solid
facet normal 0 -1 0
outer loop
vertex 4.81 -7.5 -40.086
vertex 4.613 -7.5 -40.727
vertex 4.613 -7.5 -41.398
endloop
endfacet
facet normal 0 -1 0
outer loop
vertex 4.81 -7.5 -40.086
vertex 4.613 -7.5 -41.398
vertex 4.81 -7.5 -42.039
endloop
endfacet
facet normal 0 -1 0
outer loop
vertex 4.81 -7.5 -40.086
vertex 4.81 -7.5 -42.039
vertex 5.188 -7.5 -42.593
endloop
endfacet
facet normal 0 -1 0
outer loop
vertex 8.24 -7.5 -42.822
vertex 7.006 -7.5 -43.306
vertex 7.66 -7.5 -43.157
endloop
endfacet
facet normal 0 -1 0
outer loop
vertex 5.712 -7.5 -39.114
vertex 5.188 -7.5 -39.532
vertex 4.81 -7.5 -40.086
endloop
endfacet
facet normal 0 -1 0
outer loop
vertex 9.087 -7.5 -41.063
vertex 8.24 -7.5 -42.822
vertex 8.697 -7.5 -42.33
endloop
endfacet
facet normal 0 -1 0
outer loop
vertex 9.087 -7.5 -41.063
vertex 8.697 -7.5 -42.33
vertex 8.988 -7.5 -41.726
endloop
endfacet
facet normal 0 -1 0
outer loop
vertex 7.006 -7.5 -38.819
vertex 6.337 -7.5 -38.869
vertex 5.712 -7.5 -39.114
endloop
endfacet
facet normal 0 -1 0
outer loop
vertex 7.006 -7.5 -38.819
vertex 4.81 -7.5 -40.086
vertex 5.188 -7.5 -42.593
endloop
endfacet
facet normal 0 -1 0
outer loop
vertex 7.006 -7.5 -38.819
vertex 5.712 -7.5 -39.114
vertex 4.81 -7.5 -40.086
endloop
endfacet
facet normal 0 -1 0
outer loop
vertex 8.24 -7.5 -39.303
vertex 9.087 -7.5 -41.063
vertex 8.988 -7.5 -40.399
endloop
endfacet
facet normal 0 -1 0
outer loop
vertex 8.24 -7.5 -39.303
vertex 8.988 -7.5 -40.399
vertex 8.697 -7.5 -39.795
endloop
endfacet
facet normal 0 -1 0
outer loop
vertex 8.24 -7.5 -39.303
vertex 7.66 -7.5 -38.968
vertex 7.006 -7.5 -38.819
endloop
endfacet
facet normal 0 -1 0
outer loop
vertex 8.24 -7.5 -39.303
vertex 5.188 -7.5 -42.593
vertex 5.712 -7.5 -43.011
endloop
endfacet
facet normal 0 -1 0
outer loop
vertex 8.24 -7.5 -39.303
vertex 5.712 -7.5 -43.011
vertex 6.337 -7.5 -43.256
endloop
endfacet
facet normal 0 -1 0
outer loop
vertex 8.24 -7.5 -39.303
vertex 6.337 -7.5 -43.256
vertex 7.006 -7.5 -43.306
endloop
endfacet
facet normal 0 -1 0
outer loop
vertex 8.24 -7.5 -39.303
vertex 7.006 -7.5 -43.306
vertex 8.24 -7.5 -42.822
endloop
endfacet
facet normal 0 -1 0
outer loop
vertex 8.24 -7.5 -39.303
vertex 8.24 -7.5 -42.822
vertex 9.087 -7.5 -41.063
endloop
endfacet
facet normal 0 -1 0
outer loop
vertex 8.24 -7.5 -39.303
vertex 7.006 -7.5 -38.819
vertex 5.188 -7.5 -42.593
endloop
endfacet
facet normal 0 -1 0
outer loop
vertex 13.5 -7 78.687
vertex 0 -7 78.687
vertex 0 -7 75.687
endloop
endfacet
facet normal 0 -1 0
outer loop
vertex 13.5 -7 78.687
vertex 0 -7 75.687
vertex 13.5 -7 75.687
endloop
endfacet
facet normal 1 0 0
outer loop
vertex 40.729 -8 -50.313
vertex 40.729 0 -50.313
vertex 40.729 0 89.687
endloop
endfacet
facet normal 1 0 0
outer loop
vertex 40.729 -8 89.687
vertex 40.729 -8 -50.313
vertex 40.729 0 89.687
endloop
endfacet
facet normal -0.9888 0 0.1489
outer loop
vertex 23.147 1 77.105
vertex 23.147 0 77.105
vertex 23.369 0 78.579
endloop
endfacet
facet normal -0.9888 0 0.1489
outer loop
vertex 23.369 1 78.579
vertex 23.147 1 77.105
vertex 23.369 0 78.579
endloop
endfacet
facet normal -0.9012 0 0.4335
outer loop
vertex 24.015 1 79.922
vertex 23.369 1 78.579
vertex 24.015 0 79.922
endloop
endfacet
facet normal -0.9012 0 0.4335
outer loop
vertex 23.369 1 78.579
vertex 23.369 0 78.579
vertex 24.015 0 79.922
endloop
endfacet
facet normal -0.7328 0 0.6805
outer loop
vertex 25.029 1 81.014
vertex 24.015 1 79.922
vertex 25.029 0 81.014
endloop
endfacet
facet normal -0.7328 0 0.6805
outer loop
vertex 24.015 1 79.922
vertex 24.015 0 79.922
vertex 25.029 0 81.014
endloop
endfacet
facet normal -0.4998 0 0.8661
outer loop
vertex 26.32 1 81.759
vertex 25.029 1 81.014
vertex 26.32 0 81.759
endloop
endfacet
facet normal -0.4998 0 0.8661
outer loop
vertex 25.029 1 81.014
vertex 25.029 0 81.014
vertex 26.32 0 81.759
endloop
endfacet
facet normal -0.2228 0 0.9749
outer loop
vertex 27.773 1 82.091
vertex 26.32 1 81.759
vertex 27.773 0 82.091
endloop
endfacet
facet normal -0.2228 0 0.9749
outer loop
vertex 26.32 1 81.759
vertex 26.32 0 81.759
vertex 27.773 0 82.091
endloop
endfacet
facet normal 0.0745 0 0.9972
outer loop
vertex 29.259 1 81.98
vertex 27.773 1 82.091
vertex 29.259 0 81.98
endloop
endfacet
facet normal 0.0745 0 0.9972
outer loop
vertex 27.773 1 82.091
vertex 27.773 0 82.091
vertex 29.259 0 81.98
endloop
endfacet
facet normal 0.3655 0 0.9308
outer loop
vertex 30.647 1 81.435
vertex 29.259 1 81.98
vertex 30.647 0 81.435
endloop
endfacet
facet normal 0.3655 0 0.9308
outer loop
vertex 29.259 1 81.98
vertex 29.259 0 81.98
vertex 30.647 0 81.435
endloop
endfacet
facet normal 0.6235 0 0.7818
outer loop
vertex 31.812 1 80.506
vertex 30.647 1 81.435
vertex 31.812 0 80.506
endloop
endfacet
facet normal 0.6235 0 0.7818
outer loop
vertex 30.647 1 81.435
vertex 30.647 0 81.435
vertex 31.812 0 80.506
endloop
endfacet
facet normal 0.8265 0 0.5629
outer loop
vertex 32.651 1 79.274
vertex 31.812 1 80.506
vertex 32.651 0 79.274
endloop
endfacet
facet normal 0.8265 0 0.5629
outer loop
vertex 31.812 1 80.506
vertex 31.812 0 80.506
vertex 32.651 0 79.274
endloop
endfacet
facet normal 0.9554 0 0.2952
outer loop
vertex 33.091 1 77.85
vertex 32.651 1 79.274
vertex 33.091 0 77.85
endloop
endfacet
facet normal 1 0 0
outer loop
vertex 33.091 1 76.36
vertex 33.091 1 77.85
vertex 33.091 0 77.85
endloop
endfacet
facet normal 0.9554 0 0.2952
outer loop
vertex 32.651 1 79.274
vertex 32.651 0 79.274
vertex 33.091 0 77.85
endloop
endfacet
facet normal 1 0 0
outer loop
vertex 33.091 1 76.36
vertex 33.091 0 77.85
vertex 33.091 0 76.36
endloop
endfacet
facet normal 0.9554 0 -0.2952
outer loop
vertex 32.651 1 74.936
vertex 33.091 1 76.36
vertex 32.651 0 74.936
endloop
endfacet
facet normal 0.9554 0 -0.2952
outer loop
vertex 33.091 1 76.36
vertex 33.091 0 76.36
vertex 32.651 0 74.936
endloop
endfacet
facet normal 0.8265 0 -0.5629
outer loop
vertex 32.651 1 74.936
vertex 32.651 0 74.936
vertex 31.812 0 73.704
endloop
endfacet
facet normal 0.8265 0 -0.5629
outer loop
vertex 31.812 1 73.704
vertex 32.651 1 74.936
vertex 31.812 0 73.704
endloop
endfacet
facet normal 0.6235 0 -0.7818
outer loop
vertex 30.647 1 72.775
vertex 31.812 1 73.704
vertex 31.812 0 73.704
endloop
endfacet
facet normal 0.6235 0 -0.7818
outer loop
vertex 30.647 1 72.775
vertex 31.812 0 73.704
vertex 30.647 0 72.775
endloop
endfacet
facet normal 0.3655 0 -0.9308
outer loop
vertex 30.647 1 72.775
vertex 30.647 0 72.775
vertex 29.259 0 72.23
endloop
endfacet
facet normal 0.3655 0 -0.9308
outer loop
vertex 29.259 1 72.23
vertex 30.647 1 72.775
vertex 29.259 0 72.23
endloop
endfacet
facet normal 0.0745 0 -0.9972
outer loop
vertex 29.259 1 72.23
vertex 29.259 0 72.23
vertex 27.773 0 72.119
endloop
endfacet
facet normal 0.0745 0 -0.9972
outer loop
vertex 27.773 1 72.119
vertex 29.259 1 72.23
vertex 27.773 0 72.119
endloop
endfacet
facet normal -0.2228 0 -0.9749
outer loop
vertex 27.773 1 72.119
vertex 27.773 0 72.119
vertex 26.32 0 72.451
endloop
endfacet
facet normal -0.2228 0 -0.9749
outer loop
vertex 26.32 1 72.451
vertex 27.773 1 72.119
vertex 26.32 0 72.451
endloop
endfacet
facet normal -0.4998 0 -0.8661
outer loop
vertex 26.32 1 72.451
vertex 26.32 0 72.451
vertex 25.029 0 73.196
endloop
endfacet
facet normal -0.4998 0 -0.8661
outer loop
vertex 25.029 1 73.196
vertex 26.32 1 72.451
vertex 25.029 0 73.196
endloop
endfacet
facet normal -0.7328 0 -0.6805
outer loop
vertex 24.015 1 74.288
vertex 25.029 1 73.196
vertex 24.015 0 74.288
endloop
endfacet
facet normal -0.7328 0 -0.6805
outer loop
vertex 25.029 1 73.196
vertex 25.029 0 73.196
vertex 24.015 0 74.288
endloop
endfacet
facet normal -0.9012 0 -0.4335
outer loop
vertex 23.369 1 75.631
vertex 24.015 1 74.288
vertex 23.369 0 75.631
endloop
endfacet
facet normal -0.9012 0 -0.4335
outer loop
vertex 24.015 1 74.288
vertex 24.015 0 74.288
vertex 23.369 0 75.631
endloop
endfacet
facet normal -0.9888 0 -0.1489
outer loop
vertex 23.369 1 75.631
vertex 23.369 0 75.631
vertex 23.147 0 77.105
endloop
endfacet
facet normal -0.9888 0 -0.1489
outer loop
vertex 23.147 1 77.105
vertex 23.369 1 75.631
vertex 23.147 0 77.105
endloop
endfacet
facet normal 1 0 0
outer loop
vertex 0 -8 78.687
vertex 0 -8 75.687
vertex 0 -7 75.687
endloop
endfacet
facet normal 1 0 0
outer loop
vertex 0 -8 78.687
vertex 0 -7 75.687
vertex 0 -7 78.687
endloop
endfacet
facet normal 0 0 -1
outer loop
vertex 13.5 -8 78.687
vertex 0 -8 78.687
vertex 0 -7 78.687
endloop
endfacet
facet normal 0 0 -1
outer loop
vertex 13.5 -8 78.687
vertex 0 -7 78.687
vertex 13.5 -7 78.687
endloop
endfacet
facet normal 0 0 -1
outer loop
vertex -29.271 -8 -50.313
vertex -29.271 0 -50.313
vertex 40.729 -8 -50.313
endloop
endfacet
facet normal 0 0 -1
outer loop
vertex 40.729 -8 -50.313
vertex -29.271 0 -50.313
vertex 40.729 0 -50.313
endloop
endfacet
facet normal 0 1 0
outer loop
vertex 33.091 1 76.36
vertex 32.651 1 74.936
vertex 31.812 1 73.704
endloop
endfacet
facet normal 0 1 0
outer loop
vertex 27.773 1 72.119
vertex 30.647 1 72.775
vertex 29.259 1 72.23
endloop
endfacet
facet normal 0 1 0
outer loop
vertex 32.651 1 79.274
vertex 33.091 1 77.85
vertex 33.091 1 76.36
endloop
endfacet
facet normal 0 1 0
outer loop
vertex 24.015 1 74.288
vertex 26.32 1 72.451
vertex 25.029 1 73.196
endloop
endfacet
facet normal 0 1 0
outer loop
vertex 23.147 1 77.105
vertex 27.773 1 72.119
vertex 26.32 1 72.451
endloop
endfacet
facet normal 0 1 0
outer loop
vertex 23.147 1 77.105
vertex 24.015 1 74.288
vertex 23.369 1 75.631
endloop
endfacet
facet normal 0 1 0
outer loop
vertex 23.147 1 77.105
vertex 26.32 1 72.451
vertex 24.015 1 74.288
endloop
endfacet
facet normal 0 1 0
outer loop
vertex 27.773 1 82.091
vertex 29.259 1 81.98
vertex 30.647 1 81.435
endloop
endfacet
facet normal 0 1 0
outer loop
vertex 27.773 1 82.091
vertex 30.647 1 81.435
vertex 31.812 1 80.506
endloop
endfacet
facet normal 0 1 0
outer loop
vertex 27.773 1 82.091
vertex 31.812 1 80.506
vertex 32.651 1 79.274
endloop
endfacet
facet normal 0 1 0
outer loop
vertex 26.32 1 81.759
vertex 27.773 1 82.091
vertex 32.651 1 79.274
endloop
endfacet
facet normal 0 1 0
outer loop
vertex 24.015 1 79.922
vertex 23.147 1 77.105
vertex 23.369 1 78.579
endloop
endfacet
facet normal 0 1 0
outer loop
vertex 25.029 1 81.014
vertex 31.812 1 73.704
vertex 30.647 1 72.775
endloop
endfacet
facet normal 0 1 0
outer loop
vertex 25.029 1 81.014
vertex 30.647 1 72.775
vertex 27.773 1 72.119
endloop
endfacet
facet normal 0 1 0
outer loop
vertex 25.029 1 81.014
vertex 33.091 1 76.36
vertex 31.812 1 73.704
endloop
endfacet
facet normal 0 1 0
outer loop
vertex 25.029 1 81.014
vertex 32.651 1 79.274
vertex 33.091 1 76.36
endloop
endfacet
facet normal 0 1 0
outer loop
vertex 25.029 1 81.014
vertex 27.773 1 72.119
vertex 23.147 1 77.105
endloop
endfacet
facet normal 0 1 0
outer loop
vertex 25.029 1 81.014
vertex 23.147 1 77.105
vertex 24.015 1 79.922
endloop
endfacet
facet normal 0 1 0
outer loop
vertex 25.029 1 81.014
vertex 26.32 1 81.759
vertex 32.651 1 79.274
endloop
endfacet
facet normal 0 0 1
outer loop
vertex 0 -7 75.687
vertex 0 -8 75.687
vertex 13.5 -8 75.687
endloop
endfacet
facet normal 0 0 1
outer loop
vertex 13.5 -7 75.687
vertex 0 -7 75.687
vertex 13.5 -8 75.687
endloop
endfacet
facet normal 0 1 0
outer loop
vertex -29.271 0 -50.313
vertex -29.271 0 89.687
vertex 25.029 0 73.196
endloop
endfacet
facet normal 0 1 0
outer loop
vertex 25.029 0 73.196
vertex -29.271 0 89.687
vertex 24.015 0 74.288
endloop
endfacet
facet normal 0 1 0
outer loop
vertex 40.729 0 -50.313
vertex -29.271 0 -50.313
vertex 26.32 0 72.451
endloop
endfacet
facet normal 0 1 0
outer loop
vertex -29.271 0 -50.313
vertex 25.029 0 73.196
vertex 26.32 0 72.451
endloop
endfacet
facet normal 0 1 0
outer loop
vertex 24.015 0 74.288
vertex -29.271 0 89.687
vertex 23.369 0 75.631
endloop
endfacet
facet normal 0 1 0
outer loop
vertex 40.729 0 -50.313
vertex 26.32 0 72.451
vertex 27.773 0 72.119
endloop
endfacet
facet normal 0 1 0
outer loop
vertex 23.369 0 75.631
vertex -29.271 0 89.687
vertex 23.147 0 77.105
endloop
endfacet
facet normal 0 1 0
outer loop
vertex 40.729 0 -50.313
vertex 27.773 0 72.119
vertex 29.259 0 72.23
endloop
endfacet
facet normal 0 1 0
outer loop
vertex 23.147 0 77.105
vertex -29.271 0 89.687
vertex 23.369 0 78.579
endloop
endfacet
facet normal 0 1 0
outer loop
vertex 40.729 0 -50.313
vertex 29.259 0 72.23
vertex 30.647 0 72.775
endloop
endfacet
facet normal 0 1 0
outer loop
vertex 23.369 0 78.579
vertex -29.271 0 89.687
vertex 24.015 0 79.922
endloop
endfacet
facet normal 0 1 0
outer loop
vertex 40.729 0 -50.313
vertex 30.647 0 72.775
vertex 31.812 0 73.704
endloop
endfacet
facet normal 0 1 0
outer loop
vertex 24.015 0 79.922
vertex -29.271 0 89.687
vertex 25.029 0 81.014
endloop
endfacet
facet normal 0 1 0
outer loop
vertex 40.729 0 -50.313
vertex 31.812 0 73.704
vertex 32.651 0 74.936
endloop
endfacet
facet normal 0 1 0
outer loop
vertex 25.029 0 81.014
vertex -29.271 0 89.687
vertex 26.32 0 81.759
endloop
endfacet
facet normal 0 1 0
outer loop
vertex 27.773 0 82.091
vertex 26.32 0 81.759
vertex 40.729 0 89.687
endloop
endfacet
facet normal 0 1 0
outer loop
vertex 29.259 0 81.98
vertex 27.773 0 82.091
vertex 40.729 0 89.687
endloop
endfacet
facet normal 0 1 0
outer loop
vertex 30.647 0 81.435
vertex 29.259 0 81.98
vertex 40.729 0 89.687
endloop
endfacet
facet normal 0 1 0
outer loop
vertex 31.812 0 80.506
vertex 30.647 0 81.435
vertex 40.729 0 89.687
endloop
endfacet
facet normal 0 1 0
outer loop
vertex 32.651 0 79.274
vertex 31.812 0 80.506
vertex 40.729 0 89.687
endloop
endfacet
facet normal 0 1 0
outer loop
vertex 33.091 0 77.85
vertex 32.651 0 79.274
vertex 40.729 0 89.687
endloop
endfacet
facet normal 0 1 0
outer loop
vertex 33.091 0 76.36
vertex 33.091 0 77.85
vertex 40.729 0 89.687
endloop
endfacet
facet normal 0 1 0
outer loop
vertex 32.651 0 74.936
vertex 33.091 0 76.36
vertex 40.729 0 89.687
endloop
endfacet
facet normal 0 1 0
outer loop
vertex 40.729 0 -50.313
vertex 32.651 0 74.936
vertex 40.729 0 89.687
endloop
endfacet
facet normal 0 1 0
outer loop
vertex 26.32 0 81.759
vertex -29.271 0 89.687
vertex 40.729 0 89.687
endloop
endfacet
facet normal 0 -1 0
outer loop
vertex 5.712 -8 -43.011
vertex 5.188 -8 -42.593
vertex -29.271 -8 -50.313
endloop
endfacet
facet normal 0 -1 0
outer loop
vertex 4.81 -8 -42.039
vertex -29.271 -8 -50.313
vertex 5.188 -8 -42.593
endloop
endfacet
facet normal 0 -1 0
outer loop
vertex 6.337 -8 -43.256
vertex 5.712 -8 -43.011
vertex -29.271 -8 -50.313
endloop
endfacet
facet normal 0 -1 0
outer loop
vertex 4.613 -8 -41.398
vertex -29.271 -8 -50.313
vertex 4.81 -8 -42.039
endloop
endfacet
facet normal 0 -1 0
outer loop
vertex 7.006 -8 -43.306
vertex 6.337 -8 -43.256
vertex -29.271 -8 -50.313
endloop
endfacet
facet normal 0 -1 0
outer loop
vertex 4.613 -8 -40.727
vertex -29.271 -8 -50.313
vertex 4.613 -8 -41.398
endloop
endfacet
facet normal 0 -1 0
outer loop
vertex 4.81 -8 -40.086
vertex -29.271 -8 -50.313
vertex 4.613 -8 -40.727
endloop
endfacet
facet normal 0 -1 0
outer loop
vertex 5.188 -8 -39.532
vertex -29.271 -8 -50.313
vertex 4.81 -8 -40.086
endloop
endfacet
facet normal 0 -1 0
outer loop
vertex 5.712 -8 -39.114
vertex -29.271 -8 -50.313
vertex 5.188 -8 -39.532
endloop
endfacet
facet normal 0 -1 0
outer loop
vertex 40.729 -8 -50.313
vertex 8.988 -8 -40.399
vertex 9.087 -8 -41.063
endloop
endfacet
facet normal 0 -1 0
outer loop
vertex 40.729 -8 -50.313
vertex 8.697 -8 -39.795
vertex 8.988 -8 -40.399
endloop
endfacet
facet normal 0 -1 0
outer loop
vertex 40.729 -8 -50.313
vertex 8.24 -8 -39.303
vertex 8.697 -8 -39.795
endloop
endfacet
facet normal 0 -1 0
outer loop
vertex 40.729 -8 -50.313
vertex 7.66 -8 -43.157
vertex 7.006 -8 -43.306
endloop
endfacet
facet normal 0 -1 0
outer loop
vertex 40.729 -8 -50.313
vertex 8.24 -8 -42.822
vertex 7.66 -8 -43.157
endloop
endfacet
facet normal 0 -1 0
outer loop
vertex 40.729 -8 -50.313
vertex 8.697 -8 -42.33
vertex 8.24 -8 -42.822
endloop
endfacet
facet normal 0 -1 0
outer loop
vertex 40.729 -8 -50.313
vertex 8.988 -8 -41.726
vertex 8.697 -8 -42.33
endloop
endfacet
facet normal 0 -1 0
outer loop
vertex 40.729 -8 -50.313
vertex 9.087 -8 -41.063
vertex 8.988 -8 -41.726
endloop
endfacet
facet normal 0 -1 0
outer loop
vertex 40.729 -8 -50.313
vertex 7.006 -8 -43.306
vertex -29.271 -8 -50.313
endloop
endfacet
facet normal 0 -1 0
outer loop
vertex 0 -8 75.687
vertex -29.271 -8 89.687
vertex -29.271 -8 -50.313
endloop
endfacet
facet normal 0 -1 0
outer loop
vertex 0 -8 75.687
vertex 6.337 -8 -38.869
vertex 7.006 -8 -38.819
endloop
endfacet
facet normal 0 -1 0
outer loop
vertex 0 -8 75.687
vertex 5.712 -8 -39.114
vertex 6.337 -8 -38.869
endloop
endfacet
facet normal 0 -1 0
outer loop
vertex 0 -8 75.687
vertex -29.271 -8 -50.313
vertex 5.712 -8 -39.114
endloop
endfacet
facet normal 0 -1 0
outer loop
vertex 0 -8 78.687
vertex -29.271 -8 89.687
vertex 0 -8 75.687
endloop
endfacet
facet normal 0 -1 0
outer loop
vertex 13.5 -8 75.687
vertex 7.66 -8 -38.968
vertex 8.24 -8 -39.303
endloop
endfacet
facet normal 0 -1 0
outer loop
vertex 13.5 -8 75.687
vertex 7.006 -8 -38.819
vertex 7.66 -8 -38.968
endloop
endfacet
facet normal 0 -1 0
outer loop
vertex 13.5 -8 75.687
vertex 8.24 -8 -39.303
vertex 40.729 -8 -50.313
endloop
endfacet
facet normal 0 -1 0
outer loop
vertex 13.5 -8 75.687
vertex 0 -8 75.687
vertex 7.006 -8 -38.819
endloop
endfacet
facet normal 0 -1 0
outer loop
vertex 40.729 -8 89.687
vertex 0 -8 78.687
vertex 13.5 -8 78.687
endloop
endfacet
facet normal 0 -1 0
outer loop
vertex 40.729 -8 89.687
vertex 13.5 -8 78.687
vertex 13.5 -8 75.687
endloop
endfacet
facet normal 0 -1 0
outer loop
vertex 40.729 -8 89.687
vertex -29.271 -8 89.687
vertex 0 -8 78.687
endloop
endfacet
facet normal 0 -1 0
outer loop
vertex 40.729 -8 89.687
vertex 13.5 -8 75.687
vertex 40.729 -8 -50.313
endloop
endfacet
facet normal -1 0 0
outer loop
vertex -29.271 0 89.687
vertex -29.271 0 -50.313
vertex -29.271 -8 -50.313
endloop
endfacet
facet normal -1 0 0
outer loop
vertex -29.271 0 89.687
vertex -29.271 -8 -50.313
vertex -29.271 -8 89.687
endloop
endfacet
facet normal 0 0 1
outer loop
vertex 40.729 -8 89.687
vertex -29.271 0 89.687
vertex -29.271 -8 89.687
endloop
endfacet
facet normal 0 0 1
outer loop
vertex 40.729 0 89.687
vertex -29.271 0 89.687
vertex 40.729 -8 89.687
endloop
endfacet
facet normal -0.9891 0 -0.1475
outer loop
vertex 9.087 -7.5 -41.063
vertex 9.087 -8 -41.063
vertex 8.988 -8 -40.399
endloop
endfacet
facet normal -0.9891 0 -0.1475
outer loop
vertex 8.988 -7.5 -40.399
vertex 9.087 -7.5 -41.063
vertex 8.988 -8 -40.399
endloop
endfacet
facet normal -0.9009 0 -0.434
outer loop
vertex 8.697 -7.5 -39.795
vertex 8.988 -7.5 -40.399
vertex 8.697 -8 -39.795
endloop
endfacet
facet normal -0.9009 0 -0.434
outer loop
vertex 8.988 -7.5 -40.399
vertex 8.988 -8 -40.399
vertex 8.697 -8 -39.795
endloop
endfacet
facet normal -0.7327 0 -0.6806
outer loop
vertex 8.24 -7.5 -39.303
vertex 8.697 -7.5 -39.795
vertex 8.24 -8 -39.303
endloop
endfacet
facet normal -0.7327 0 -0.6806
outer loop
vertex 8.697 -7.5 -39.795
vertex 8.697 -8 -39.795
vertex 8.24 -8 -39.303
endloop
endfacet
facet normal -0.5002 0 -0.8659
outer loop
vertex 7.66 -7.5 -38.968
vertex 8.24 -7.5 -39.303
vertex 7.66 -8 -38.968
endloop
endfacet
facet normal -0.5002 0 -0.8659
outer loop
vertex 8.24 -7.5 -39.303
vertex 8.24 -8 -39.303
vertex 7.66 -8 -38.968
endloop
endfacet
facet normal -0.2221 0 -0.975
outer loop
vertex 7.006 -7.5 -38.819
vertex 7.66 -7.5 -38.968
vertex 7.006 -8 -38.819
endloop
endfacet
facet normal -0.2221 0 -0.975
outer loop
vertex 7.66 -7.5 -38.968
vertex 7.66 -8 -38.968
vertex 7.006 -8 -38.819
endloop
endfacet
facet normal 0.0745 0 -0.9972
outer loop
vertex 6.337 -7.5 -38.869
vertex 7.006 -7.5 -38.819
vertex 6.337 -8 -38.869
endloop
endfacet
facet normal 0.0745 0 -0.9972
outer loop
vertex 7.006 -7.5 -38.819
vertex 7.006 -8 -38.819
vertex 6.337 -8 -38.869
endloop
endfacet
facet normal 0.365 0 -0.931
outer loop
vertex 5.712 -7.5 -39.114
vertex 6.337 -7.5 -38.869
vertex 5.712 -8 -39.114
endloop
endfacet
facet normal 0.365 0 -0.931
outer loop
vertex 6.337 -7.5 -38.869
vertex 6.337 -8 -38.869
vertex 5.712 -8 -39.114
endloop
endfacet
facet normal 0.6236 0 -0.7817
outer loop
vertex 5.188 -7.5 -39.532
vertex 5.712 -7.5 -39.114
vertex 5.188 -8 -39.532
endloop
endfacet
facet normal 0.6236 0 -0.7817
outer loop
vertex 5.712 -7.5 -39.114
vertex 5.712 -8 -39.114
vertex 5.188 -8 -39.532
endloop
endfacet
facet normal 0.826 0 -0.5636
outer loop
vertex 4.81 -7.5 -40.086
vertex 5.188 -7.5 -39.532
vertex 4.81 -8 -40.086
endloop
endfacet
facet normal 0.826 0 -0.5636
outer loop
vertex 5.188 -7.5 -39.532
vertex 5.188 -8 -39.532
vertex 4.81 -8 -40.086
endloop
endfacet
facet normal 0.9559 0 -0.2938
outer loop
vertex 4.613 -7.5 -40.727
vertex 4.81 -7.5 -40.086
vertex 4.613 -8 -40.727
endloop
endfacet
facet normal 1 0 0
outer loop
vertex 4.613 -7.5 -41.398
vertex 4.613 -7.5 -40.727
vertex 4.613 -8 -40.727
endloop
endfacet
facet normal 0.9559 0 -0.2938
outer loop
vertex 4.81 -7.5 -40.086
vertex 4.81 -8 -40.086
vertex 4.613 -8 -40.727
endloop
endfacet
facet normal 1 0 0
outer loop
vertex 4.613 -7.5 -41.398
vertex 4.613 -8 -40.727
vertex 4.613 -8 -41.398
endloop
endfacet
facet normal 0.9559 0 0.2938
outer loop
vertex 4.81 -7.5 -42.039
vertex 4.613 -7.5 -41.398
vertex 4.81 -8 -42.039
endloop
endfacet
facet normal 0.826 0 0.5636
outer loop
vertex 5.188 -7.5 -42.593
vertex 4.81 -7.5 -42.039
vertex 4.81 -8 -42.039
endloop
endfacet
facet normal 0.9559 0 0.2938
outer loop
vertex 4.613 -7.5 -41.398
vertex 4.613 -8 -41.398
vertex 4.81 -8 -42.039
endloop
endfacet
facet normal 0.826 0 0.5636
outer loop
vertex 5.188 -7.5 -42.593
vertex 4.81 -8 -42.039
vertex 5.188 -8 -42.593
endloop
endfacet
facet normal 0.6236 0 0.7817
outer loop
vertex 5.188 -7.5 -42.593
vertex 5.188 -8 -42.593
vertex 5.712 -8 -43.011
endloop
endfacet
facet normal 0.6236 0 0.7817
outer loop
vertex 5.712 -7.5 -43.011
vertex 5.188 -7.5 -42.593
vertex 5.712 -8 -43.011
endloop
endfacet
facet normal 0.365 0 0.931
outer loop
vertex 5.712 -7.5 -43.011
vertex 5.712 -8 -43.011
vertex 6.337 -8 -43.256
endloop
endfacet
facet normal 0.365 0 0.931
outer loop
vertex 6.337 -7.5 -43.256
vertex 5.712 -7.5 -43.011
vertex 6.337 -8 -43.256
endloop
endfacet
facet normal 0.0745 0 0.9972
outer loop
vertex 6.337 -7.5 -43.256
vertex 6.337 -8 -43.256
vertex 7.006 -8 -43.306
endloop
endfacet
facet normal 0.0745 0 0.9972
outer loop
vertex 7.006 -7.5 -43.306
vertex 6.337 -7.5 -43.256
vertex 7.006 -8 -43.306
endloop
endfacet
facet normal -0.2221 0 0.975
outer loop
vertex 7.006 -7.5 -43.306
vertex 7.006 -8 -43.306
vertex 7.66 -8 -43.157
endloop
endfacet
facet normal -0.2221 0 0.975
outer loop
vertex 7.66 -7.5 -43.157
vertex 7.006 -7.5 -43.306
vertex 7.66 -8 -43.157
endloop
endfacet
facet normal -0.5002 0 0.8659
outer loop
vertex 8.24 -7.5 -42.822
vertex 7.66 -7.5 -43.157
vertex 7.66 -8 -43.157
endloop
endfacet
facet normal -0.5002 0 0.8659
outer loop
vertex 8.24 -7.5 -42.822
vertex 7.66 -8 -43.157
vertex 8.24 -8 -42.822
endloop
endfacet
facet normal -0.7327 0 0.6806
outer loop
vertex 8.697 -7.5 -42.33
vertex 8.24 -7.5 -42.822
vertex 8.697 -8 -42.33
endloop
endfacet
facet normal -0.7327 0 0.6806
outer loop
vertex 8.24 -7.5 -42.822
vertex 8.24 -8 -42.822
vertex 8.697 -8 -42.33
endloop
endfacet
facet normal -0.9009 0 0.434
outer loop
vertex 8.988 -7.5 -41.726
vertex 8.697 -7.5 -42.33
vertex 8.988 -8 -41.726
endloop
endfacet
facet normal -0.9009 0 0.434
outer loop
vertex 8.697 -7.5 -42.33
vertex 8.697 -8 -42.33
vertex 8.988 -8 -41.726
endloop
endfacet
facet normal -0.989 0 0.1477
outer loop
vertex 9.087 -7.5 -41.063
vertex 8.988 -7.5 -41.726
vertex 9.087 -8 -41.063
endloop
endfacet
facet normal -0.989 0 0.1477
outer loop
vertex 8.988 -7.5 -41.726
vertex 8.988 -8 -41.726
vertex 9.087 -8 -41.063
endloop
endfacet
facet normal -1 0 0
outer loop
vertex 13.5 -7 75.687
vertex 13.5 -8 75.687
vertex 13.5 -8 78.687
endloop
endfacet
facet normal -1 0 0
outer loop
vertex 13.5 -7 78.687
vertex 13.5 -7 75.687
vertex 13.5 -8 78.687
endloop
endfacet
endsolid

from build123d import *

# Parameters (mm, degrees)
F0_W     = 70
F0_H     = 140
F1_DEPTH = 8
F2_W     = 13.5
F2_H     = 3
F3_DEPTH = 1
F4_R     = 2.25
F5_DEPTH = 0.5
F6_R     = 5
F7_DEPTH = 1


# Not quite as in the source:
# - a feature of the source that left no trace in its solid (it failed there, or was rolled back) is left out


with BuildPart() as f1:
    # F0 (on Front) → F1 (new body)
    with BuildSketch(Plane.XZ):
        with Locations((5.7291688025, 19.6874958277)):
            Rectangle(F0_W, F0_H)
    extrude(amount=F1_DEPTH)

    # F2 (on face) → F3 (cut)
    with BuildSketch(Plane.XZ.offset(8)):
        with Locations((6.75, 77.1874958277)):
            Rectangle(F2_W, F2_H)
    extrude(amount=-F3_DEPTH, mode=Mode.SUBTRACT)

    # F4 (on face) → F5 (cut)
    with BuildSketch(Plane.XZ.offset(8)):
        with Locations((6.8374876864, -41.0625041723)):
            Circle(F4_R)
    extrude(amount=-F5_DEPTH, mode=Mode.SUBTRACT)

    # F6 (on face) → F7 (join)
    with BuildSketch(Plane(origin=(0, 0, 0), x_dir=(-1, 0, 0), z_dir=(0, 1, 0))):
        with Locations((-28.1465931075, 77.1049201327)):
            Circle(F6_R)
    extrude(amount=F7_DEPTH)


solid = f1.part
